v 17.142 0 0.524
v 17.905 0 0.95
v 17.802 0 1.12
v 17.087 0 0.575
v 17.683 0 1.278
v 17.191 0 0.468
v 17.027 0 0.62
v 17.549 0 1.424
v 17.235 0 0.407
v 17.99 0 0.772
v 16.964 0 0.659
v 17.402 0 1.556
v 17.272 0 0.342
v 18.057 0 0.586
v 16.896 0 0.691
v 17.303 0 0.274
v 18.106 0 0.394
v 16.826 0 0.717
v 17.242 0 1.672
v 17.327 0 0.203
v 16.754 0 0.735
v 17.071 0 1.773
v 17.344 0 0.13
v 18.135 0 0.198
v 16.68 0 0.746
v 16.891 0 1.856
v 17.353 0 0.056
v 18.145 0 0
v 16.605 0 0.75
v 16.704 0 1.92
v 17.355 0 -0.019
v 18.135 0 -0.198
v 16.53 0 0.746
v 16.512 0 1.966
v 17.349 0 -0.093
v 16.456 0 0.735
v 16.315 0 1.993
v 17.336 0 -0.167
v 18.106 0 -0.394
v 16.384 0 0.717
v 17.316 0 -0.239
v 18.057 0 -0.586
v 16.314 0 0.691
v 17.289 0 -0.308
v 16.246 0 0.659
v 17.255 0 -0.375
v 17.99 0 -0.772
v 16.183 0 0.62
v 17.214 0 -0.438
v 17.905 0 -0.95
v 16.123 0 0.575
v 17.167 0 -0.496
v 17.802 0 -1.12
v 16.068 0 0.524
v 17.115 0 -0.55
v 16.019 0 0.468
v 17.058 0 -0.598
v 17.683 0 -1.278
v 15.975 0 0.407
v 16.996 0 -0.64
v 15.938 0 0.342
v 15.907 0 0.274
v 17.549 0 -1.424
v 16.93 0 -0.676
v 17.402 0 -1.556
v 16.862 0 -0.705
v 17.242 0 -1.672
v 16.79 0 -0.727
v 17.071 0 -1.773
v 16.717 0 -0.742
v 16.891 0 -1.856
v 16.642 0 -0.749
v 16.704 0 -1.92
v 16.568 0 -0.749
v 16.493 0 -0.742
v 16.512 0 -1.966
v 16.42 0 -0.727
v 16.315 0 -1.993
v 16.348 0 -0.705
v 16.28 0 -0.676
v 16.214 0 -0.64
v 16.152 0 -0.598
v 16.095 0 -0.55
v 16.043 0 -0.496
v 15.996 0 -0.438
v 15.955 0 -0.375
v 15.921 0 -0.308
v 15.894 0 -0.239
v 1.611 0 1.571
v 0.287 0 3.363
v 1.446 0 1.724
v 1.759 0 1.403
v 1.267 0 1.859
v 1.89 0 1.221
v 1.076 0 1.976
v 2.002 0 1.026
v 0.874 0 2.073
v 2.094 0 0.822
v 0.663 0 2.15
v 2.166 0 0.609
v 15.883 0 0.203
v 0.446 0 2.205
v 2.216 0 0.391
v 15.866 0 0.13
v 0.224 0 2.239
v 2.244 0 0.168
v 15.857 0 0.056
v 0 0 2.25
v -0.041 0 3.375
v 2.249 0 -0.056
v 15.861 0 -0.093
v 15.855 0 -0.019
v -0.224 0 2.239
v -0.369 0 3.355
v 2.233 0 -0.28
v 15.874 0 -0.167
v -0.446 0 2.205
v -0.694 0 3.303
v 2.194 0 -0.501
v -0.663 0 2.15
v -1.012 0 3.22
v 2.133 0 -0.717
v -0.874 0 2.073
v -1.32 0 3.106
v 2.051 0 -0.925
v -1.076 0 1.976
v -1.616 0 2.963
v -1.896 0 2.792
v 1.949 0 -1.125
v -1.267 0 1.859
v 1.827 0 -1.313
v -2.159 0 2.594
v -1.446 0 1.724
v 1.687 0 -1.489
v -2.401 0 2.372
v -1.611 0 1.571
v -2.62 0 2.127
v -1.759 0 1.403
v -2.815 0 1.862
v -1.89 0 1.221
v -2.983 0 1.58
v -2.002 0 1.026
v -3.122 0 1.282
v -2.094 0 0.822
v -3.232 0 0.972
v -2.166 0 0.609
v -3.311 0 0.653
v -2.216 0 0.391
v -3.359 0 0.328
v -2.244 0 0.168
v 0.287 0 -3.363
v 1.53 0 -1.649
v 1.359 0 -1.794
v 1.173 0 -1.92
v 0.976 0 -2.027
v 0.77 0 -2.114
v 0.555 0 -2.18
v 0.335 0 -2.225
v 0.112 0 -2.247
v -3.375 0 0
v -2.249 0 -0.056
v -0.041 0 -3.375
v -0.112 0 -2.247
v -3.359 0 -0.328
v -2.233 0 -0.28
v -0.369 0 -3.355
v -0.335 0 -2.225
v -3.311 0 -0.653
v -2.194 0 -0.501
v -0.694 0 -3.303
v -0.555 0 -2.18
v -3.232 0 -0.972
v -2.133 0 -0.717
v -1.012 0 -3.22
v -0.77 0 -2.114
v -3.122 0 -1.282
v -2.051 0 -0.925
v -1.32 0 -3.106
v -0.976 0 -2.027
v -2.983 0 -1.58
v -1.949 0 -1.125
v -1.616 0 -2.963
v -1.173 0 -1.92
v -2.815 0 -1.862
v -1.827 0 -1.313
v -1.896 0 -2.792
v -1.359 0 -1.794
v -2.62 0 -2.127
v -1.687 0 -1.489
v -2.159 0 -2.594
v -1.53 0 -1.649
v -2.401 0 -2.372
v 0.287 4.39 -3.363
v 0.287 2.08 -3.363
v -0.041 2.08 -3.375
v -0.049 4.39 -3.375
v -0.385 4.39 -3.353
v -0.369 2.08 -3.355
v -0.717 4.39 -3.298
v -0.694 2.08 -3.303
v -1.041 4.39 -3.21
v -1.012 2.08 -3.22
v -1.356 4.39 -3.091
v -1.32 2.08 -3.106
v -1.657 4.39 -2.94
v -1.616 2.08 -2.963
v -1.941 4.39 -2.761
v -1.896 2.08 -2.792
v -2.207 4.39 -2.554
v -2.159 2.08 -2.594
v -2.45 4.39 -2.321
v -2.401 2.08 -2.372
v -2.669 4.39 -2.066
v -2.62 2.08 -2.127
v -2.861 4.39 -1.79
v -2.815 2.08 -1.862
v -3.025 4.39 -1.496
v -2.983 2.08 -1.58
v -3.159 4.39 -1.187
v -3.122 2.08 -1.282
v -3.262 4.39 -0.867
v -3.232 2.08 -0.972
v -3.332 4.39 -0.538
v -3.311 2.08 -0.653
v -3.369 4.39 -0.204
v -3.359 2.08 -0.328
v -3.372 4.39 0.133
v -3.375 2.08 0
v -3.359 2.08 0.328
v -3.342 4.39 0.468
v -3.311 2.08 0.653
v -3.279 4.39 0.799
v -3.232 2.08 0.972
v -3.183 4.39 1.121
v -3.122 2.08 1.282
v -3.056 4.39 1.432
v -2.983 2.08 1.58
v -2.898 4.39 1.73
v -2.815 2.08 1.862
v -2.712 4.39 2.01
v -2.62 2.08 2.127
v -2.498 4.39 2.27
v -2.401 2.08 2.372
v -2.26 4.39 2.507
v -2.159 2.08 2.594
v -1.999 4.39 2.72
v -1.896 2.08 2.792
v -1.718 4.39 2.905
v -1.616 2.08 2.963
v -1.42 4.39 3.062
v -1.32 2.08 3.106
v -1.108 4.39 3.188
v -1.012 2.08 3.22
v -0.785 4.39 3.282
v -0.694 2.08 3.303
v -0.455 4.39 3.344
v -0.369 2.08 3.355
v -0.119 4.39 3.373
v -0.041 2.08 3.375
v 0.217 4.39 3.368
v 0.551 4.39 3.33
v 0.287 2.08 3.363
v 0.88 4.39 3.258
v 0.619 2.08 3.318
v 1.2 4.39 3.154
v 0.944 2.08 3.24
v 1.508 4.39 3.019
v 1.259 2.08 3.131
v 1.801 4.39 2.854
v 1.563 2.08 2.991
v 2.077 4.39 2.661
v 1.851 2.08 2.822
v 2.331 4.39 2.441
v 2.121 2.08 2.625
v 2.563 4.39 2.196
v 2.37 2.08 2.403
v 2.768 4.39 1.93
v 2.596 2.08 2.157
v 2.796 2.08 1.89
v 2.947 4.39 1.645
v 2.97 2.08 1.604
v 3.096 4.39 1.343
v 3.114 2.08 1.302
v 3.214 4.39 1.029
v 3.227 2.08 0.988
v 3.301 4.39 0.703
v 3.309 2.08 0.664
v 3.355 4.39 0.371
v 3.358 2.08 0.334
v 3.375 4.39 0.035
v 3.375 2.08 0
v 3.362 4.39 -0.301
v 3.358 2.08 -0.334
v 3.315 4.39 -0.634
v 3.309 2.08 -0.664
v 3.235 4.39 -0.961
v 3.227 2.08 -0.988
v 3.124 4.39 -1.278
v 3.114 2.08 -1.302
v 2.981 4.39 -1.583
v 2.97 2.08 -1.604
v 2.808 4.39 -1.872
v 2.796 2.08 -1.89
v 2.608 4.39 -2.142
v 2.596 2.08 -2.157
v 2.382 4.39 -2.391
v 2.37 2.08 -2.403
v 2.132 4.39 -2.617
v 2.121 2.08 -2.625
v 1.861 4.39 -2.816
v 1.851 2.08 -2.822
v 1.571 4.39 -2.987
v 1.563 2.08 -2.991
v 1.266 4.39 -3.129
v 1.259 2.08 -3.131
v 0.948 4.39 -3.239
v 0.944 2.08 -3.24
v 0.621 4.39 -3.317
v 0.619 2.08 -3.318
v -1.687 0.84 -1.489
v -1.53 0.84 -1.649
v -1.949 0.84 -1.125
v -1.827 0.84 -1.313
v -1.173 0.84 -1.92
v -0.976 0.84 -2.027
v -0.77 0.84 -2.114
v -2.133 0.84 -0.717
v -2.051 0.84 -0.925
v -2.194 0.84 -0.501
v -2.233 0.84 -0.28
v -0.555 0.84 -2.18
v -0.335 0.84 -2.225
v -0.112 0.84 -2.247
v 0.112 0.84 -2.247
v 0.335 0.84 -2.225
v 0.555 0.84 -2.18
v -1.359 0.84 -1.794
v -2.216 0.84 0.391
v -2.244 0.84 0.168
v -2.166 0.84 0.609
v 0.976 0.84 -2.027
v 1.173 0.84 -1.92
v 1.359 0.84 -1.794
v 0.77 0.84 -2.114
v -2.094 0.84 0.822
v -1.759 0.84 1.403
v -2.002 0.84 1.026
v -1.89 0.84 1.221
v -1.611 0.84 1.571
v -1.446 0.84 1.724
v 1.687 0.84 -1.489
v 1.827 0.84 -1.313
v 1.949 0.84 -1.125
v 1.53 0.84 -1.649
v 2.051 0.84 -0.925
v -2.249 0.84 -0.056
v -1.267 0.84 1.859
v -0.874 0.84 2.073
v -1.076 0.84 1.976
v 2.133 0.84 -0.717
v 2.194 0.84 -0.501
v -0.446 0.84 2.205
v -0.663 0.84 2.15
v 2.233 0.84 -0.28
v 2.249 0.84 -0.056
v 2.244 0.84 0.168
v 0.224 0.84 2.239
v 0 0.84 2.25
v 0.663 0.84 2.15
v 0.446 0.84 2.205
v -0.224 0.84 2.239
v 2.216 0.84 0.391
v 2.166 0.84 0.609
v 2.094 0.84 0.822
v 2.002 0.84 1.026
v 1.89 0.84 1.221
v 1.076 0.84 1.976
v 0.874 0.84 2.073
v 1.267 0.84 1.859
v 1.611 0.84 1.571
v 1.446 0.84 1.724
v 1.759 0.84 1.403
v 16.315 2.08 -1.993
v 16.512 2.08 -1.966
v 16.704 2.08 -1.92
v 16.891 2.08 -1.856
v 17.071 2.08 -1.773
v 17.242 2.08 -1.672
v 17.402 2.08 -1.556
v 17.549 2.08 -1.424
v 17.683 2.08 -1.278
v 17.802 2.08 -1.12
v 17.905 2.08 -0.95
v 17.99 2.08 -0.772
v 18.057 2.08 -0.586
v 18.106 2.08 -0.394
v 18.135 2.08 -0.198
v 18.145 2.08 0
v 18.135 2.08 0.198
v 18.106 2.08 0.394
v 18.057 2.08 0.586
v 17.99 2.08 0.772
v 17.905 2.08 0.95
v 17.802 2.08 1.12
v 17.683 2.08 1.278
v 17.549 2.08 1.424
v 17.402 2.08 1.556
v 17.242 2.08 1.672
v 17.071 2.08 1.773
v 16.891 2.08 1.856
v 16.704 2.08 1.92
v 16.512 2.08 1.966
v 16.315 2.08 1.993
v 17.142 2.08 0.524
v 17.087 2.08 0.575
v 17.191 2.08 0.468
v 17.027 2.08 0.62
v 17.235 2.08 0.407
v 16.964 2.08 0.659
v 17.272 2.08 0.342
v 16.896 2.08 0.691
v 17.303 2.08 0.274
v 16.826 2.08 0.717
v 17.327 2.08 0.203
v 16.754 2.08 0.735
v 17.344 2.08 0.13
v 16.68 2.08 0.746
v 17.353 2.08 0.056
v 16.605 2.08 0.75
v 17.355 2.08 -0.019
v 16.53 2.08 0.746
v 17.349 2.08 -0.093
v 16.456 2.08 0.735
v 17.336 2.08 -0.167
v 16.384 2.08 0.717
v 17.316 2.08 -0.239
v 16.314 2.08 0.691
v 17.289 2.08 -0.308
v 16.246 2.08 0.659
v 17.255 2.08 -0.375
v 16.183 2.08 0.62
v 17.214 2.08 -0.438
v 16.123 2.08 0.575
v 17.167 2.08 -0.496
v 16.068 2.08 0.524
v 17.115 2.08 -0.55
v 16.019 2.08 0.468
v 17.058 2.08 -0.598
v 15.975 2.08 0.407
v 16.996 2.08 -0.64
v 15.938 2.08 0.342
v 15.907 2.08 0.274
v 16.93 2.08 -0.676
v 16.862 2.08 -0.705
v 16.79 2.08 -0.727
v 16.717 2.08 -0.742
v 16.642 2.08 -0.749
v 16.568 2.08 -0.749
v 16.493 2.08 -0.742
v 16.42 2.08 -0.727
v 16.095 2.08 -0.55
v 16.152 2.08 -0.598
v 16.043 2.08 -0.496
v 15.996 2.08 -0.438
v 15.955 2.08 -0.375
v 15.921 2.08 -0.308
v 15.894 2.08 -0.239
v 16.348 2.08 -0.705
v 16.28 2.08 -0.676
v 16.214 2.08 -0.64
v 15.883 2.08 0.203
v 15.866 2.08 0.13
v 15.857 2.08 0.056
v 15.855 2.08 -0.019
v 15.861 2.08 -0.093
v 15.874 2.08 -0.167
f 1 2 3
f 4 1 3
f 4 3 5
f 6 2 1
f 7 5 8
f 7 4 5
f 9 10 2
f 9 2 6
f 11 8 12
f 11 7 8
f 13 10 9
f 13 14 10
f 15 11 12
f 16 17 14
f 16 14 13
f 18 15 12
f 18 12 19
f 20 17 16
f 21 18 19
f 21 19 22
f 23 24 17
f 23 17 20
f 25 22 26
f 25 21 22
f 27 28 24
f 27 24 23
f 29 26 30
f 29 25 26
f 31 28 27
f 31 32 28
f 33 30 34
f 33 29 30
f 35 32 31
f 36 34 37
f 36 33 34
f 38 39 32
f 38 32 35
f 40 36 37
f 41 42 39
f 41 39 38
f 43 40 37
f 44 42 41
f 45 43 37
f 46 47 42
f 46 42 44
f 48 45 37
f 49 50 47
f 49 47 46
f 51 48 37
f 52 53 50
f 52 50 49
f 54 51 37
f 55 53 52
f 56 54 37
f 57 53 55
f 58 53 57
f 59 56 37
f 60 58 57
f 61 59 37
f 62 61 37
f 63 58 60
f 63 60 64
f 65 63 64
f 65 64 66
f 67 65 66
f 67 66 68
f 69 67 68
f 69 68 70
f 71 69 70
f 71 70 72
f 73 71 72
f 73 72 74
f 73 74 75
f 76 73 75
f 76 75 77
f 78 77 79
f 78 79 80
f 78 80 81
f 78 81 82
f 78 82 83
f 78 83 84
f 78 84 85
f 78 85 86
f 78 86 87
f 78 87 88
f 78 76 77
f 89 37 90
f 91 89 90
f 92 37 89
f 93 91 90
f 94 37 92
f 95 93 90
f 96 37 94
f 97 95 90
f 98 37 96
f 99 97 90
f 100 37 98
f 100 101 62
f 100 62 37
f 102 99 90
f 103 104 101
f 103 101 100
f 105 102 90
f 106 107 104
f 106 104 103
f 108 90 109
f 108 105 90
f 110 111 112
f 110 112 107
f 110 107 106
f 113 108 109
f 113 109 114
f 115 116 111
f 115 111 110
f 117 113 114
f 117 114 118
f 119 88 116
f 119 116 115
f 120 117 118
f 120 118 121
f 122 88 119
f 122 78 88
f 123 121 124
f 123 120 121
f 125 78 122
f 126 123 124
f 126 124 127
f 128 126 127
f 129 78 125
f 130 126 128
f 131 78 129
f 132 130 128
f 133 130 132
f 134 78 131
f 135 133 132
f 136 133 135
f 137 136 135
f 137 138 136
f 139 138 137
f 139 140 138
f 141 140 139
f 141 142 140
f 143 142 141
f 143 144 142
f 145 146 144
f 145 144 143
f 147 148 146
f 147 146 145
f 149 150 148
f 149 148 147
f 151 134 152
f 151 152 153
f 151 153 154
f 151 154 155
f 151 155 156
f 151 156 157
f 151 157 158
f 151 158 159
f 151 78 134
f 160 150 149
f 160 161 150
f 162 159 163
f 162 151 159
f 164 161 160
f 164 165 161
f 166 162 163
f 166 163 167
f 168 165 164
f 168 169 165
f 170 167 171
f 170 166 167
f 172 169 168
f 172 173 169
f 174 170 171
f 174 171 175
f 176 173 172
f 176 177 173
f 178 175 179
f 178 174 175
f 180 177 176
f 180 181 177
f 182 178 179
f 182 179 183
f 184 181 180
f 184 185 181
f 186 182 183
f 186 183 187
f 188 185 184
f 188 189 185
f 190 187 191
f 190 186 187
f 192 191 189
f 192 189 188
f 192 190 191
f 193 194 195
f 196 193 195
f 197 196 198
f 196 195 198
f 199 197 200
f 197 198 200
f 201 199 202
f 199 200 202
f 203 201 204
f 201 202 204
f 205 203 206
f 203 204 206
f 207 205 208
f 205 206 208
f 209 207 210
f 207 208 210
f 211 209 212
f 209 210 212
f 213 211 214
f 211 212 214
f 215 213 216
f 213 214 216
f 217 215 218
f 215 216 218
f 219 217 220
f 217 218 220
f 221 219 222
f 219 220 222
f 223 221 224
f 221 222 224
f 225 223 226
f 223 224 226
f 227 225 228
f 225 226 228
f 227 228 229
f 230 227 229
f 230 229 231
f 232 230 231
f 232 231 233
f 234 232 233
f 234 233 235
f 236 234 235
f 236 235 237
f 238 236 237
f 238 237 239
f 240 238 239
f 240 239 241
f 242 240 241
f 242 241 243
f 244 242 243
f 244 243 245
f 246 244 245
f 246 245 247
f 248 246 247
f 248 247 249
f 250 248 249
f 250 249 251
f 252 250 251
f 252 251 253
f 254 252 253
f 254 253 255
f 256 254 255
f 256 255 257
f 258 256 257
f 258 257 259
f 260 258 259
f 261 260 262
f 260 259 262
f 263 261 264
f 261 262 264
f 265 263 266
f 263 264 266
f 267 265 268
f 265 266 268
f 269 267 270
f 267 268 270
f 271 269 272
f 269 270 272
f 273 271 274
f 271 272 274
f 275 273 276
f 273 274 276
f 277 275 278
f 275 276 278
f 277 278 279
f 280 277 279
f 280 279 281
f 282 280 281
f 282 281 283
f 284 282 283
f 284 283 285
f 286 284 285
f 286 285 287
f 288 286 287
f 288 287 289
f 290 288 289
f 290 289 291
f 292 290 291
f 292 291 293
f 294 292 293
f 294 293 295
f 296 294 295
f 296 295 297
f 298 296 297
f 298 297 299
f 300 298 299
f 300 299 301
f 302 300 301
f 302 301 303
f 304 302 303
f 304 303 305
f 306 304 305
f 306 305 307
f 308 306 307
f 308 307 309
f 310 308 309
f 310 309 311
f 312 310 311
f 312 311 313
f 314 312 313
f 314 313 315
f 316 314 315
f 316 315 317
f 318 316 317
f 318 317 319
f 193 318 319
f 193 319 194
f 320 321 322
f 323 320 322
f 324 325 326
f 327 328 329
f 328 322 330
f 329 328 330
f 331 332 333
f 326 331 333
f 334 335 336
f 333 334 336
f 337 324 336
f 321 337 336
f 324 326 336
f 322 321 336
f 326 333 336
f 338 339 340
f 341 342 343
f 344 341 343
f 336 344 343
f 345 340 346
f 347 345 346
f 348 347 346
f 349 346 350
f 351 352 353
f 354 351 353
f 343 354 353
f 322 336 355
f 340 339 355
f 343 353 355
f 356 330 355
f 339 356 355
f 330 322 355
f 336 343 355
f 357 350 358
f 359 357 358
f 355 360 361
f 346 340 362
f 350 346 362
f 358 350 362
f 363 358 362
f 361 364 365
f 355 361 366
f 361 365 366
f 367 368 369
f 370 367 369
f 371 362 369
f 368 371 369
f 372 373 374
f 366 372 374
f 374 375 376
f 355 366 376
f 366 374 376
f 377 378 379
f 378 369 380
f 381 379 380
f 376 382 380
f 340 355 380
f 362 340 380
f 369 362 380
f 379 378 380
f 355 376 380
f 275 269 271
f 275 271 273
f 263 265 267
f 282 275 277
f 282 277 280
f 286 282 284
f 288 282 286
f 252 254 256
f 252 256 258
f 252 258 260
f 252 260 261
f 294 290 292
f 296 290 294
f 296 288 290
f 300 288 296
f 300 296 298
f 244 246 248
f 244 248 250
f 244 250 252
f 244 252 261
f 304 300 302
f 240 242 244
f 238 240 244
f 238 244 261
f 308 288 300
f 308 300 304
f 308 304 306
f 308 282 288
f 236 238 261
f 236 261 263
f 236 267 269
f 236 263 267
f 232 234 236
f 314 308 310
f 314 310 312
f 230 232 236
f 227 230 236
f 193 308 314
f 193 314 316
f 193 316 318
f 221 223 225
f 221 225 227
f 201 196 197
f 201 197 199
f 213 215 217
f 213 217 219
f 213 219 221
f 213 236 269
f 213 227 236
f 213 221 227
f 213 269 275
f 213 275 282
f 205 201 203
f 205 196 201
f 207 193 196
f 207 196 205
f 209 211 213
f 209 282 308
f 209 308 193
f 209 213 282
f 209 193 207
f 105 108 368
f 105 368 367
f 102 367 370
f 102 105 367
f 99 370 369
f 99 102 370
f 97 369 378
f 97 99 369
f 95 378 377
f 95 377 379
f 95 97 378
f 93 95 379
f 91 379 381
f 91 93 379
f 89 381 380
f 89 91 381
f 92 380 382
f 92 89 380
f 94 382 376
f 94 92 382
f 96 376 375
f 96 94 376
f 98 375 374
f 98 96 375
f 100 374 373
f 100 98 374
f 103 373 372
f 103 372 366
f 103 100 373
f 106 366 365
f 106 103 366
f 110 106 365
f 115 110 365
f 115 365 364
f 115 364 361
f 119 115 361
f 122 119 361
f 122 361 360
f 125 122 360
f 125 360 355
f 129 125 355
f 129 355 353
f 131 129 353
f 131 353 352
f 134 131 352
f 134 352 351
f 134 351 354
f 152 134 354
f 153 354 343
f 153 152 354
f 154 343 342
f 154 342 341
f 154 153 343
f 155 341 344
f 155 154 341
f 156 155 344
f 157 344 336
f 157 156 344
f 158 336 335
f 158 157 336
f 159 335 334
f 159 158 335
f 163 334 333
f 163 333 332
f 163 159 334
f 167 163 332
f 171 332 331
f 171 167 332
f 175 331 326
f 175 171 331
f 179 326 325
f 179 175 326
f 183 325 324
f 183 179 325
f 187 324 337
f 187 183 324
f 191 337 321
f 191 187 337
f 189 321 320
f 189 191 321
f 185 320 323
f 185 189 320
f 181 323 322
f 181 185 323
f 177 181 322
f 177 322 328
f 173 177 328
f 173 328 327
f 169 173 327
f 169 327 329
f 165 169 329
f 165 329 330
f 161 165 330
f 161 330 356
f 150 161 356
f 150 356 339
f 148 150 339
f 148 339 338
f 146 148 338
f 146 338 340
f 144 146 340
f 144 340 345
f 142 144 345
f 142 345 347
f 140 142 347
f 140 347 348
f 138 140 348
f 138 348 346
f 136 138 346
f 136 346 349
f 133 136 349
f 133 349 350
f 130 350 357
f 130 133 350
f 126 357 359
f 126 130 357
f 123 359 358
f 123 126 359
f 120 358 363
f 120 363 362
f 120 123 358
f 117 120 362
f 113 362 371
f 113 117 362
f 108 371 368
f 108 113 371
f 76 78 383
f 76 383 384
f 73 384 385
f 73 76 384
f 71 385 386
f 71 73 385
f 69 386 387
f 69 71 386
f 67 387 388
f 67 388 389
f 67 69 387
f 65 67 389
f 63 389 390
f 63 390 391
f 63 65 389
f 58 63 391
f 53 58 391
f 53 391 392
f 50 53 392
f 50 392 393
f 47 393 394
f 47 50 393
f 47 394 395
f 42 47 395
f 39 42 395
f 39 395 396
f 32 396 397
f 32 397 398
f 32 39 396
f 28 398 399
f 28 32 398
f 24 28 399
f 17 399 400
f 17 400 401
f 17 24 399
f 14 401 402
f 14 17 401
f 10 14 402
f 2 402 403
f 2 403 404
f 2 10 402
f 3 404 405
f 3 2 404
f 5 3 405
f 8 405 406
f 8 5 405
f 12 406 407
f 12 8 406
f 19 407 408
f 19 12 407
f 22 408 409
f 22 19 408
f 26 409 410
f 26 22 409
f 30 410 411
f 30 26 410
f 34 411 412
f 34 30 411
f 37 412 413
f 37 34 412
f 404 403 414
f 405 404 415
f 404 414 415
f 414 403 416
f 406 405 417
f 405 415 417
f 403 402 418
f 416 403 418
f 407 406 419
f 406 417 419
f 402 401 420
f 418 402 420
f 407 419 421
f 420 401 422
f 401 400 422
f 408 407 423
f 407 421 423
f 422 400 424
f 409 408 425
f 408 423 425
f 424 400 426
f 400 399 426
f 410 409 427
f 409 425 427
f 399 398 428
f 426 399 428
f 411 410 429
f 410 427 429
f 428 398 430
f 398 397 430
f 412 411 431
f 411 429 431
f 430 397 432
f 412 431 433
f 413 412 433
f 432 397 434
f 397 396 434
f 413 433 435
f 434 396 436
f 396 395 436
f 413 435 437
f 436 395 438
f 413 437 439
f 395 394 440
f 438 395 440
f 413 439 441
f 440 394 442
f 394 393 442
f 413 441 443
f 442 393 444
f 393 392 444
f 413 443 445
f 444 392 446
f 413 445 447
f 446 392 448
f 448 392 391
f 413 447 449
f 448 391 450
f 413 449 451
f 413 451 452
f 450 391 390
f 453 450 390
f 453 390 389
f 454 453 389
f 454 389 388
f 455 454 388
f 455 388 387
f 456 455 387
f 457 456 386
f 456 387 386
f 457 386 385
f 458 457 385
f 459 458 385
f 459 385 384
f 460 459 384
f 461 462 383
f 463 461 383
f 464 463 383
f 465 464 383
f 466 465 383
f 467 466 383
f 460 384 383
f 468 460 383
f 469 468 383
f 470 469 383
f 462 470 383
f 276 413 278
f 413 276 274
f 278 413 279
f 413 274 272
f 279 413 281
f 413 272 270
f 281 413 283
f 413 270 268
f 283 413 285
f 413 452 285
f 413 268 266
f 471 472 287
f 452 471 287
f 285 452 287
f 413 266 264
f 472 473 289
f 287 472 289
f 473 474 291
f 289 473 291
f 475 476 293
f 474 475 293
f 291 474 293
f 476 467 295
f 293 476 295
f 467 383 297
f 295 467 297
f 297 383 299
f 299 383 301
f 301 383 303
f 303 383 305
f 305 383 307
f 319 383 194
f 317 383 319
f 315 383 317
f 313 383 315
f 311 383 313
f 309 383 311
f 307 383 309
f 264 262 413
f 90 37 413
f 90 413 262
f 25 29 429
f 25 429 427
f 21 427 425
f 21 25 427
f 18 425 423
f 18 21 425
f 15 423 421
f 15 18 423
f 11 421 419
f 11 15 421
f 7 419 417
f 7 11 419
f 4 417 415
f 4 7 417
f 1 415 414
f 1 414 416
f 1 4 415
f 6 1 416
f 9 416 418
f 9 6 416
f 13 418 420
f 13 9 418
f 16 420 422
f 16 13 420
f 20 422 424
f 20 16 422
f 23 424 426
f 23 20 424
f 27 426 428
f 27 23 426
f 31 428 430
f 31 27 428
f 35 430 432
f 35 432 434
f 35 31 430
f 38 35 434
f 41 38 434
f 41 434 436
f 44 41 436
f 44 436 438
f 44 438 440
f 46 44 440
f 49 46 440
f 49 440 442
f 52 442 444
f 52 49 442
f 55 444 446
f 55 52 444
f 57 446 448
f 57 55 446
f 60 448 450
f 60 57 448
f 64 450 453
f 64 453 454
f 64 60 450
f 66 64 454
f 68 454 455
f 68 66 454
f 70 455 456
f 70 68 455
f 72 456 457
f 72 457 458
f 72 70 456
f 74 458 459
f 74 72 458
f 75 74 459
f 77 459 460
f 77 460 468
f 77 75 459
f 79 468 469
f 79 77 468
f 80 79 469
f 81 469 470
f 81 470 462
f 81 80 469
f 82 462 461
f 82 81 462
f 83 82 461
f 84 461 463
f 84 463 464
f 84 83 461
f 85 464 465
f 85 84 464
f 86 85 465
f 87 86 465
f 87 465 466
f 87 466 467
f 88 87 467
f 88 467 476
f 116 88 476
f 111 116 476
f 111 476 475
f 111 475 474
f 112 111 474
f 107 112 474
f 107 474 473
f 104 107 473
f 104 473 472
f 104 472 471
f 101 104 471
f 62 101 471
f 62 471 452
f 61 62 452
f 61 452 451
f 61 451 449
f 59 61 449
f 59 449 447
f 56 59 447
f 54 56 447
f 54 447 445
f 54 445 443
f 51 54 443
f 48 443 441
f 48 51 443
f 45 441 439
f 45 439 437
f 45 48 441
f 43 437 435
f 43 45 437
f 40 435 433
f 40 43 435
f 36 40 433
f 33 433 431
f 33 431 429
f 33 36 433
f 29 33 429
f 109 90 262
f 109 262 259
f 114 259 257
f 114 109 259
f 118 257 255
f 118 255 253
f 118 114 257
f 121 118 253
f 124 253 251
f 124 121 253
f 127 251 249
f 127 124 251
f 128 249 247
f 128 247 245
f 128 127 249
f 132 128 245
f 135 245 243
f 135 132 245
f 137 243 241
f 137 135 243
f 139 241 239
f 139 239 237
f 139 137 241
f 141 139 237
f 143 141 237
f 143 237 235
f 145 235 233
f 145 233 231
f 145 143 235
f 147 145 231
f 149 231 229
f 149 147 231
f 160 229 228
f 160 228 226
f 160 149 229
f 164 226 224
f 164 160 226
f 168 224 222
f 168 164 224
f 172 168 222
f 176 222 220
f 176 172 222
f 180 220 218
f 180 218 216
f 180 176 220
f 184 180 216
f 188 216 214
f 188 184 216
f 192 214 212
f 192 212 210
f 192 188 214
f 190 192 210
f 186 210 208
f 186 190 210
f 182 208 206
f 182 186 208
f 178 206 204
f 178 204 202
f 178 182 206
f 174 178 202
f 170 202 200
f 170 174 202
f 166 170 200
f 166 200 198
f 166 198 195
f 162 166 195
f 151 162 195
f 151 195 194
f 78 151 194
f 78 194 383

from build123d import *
from build123d.topology import SkipClean

# Parameters (mm, degrees)
SKETCH1_R           = 0.75
BOSS_EXTRUDE1_DEPTH = 2.08
SKETCH2_R           = 3.375
BOSS_EXTRUDE2_DEPTH = 2.31
SKETCH3_R           = 2.25
CUT_EXTRUDE1_DEPTH  = 0.84


with BuildPart() as part:
    # Sketch1 → Boss-Extrude1 (new body)
    with BuildSketch(Plane(origin=(0, 0, 0), x_dir=(1, 0, 0), z_dir=(0, 1, 0))):
        with BuildLine():
            Line((0.28743419, 3.36273796), (16.315331372, 1.992733606))
            ThreePointArc((16.315331372, 1.992733606), (18.145, 0), (16.315331372, -1.992733606))
            Line((16.315331372, -1.992733606), (0.28743419, -3.36273796))
            ThreePointArc((0.28743419, -3.36273796), (-3.375, 0), (0.28743419, 3.36273796))
        make_face()
        with Locations(Location((16.605, 0, 0), (0, 0, 270))):
            Circle(SKETCH1_R, mode=Mode.SUBTRACT)
    extrude(amount=BOSS_EXTRUDE1_DEPTH)

    # Sketch2 → Boss-Extrude2 (add)
    with SkipClean():  # the faces are left unmerged after this step: merging them gives an invalid solid
        with BuildSketch(Plane(origin=(0, 2.08, 0), x_dir=(1, 0, 0), z_dir=(0, 1, 0))):
            with Locations(Location((0, 0, 0), (0, 0, 85.114447475))):
                Circle(SKETCH2_R)
        extrude(amount=BOSS_EXTRUDE2_DEPTH)

    # Sketch3 → Cut-Extrude1 (cut)
    with SkipClean():  # the faces are left unmerged after this step: merging them gives an invalid solid
        with BuildSketch(Plane(origin=(0, 0, 0), x_dir=(1, 0, 0), z_dir=(0, 1, 0))):
            with Locations(Location((0, 0, 0), (0, 0, 270))):
                Circle(SKETCH3_R)
        extrude(amount=CUT_EXTRUDE1_DEPTH, mode=Mode.SUBTRACT)


solid = part.part
